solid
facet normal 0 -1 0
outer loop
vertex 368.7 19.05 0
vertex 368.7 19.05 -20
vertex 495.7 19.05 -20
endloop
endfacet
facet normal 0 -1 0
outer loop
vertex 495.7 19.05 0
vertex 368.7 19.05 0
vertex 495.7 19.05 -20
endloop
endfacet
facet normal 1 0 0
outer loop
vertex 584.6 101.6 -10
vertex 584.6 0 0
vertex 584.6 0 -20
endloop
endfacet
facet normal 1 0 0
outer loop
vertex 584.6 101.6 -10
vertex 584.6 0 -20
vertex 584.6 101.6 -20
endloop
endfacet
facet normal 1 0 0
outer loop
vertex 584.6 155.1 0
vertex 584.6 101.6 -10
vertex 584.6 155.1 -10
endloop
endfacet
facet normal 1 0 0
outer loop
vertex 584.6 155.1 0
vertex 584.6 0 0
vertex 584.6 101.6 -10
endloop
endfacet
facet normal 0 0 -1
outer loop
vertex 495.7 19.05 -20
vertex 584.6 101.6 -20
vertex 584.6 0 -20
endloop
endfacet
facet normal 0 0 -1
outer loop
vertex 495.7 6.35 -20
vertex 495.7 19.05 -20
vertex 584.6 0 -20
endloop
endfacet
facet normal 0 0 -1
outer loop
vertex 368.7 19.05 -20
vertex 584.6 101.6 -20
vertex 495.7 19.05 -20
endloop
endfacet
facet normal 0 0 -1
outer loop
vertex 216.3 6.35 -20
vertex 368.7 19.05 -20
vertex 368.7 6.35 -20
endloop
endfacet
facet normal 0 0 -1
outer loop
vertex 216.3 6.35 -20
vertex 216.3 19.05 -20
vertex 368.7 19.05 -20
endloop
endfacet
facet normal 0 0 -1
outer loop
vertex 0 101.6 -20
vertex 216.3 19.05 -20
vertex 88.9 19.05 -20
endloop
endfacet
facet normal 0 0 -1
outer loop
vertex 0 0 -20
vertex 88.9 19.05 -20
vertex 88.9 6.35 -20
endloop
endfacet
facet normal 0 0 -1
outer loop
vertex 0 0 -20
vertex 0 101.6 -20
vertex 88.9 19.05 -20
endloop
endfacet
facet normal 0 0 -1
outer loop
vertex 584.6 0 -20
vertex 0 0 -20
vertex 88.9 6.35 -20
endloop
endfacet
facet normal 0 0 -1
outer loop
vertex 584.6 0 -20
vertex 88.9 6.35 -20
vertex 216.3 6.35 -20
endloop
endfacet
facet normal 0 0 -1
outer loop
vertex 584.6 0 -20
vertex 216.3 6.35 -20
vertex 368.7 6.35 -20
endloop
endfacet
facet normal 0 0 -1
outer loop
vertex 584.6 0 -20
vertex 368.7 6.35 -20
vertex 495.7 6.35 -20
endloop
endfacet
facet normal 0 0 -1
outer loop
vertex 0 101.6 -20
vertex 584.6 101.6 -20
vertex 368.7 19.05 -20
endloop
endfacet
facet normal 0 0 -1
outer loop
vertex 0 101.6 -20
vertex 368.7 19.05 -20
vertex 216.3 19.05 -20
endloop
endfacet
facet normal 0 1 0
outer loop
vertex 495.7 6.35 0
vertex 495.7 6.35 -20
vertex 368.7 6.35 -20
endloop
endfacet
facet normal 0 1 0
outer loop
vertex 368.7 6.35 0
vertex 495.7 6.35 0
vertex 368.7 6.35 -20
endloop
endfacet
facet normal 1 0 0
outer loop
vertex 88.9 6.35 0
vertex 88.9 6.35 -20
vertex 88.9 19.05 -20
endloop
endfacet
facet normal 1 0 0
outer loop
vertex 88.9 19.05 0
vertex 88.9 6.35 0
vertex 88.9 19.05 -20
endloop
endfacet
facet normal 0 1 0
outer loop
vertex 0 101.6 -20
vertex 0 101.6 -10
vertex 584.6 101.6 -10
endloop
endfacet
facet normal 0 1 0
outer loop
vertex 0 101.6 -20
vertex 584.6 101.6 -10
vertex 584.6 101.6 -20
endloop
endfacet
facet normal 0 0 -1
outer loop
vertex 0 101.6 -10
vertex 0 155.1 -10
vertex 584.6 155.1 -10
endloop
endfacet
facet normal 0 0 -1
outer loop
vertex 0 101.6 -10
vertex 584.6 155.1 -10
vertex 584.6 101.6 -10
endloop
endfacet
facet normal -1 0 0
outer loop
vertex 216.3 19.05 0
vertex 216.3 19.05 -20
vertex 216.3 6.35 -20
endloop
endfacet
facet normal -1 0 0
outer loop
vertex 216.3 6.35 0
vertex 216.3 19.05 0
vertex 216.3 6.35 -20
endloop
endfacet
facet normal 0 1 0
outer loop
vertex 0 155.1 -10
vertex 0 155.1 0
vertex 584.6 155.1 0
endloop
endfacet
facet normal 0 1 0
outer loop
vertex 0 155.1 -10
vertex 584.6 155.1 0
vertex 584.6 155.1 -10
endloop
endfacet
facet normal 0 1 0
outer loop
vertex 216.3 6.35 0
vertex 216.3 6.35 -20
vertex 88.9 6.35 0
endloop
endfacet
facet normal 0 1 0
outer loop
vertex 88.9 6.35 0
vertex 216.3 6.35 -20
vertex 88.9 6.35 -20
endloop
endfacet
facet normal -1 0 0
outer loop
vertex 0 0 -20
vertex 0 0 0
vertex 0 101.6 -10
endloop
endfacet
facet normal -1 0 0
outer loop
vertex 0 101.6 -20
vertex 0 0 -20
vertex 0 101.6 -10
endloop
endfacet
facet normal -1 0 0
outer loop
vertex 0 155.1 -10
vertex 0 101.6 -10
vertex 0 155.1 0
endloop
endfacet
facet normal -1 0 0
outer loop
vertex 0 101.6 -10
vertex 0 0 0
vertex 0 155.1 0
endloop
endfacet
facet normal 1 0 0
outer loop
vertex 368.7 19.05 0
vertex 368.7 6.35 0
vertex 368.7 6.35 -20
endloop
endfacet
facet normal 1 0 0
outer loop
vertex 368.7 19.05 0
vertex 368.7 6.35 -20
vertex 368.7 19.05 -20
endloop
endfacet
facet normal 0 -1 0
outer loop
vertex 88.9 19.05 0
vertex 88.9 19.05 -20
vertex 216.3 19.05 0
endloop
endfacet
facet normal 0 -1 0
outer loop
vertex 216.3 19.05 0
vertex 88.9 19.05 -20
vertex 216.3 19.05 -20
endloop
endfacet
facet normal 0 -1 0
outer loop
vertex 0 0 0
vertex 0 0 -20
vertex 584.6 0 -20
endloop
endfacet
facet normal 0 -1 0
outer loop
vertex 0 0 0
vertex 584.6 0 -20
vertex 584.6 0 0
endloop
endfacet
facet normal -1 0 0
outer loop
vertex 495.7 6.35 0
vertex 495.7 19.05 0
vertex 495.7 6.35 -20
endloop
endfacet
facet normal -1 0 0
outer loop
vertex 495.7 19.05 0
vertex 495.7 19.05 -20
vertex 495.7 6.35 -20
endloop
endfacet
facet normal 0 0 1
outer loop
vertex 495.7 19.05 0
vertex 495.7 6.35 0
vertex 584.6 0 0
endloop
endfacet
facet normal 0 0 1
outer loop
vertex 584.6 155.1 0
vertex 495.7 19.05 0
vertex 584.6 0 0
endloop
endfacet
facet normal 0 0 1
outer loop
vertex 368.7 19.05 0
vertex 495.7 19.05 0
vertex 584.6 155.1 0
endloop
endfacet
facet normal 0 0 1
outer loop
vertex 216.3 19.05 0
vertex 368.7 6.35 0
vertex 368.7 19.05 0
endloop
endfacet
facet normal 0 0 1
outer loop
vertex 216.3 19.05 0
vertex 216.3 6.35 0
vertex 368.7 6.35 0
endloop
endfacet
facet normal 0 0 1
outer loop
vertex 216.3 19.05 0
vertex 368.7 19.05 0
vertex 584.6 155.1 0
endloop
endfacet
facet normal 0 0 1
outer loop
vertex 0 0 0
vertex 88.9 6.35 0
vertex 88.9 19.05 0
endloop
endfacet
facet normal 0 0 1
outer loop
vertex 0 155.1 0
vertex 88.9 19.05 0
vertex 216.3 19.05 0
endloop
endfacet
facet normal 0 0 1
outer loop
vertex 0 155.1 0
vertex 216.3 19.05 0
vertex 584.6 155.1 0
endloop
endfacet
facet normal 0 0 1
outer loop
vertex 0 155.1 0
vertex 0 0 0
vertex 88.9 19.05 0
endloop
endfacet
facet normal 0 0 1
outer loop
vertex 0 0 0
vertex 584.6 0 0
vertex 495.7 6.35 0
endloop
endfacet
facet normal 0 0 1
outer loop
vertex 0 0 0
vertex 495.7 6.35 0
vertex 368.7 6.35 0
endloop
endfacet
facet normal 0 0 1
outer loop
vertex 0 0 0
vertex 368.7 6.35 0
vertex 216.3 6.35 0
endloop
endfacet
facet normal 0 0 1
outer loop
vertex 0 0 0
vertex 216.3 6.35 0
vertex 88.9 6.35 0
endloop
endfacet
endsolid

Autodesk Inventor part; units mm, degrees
ref_plane "YZ Plane" through (0, 0, 0) normal (1, 0, 0) x (0, 1, 0)
sketch "Sketch1" plane through (0, 0, 0) normal (1, 0, 0) x (0, 1, 0)
  line L0 (0, 0) -> (155.1, 0)
  line L1 (155.1, 0) -> (155.1, -10)
  line L2 (0, -20) -> (0, 0)
  line L3 (155.1, -10) -> (101.6, -10)
  line L4 (101.6, -10) -> (101.6, -20)
  line L5 (101.6, -20) -> (0, -20)
  dimension "d0" = 53.5
  dimension "d1" = 155.1
  dimension "d2" = 10
  dimension "d3" = 10
  dimension "d4" = 20
extrude "Extrusion1" add sketch "Sketch1" along normal blind 584.6
ref_plane "Work Plane2" through (609.4222, 0, -20) normal (0, 0, -1) x (-1, 0, 0)
sketch "Sketch2" plane through (609.4222, 0, -20) normal (0, 0, -1) x (-1, 0, 0)
  line L0 (609.4222, 0) -> (609.4222, 155.1) projected
  line L1 (609.4222, 0) -> (609.4222, 6.35)
  line L2 (520.5222, 6.35) -> (520.5222, 19.05)
  line L3 (520.5222, 19.05) -> (393.1222, 19.05)
  line L4 (393.1222, 19.05) -> (393.1222, 6.35)
  line L5 (393.1222, 6.35) -> (240.7222, 6.35)
  line L6 (240.7222, 6.35) -> (240.7222, 19.05)
  line L7 (240.7222, 19.05) -> (113.7222, 19.05)
  line L8 (113.7222, 19.05) -> (113.7222, 6.35)
  line L9 (113.7222, 6.35) -> (240.7222, 6.35)
  line L10 (393.1222, 6.35) -> (520.5222, 6.35)
  line L11 (24.8222, 0) -> (24.8222, 101.6) projected
  dimension "d39" = 6.35
  dimension "d41" = 12.7
  dimension "d42" = 90
  dimension "d43" = 152.4
  dimension "d44" = 127
  dimension "d45" = 12.7
  dimension "d58" = 88.9
ref_plane "Work Plane1" through (609.4222, 0, -20) normal (0, 0, -1) x (-1, 0, 0)
sketch "Sketch3" plane through (609.4222, 0, -20) normal (0, 0, -1) x (-1, 0, 0)
  line L0 (609.4222, 0) -> (609.4222, 155.1)
  line L1 (609.4222, 0) -> (609.4222, 6.35)
  line L2 (520.5222, 6.35) -> (520.5222, 19.05)
  line L3 (520.5222, 19.05) -> (393.1222, 19.05)
  line L4 (393.1222, 19.05) -> (393.1222, 6.35)
  line L5 (393.1222, 6.35) -> (240.7222, 6.35)
  line L6 (240.7222, 6.35) -> (240.7222, 19.05)
  line L7 (240.7222, 19.05) -> (113.7222, 19.05)
  line L8 (113.7222, 19.05) -> (113.7222, 6.35)
  line L9 (113.7222, 6.35) -> (240.7222, 6.35)
  line L10 (393.1222, 6.35) -> (520.5222, 6.35)
  line L11 (24.8222, 0) -> (24.8222, 101.6) projected
  dimension "d46" = 6.35
  dimension "d48" = 12.7
  dimension "d49" = 90
  dimension "d50" = 152.4
  dimension "d51" = 127
  dimension "d52" = 12.7
  dimension "d57" = 88.9
extrude "Extrusion4" cut sketch "Sketch3" against normal blind 127 contours L9 L8 L7 L6
extrude "Extrusion5" cut sketch "Sketch2" against normal blind 127 contours L10 L4 L3 L2
properties part number "SkinnySideW" material "Wood (Birch)"
